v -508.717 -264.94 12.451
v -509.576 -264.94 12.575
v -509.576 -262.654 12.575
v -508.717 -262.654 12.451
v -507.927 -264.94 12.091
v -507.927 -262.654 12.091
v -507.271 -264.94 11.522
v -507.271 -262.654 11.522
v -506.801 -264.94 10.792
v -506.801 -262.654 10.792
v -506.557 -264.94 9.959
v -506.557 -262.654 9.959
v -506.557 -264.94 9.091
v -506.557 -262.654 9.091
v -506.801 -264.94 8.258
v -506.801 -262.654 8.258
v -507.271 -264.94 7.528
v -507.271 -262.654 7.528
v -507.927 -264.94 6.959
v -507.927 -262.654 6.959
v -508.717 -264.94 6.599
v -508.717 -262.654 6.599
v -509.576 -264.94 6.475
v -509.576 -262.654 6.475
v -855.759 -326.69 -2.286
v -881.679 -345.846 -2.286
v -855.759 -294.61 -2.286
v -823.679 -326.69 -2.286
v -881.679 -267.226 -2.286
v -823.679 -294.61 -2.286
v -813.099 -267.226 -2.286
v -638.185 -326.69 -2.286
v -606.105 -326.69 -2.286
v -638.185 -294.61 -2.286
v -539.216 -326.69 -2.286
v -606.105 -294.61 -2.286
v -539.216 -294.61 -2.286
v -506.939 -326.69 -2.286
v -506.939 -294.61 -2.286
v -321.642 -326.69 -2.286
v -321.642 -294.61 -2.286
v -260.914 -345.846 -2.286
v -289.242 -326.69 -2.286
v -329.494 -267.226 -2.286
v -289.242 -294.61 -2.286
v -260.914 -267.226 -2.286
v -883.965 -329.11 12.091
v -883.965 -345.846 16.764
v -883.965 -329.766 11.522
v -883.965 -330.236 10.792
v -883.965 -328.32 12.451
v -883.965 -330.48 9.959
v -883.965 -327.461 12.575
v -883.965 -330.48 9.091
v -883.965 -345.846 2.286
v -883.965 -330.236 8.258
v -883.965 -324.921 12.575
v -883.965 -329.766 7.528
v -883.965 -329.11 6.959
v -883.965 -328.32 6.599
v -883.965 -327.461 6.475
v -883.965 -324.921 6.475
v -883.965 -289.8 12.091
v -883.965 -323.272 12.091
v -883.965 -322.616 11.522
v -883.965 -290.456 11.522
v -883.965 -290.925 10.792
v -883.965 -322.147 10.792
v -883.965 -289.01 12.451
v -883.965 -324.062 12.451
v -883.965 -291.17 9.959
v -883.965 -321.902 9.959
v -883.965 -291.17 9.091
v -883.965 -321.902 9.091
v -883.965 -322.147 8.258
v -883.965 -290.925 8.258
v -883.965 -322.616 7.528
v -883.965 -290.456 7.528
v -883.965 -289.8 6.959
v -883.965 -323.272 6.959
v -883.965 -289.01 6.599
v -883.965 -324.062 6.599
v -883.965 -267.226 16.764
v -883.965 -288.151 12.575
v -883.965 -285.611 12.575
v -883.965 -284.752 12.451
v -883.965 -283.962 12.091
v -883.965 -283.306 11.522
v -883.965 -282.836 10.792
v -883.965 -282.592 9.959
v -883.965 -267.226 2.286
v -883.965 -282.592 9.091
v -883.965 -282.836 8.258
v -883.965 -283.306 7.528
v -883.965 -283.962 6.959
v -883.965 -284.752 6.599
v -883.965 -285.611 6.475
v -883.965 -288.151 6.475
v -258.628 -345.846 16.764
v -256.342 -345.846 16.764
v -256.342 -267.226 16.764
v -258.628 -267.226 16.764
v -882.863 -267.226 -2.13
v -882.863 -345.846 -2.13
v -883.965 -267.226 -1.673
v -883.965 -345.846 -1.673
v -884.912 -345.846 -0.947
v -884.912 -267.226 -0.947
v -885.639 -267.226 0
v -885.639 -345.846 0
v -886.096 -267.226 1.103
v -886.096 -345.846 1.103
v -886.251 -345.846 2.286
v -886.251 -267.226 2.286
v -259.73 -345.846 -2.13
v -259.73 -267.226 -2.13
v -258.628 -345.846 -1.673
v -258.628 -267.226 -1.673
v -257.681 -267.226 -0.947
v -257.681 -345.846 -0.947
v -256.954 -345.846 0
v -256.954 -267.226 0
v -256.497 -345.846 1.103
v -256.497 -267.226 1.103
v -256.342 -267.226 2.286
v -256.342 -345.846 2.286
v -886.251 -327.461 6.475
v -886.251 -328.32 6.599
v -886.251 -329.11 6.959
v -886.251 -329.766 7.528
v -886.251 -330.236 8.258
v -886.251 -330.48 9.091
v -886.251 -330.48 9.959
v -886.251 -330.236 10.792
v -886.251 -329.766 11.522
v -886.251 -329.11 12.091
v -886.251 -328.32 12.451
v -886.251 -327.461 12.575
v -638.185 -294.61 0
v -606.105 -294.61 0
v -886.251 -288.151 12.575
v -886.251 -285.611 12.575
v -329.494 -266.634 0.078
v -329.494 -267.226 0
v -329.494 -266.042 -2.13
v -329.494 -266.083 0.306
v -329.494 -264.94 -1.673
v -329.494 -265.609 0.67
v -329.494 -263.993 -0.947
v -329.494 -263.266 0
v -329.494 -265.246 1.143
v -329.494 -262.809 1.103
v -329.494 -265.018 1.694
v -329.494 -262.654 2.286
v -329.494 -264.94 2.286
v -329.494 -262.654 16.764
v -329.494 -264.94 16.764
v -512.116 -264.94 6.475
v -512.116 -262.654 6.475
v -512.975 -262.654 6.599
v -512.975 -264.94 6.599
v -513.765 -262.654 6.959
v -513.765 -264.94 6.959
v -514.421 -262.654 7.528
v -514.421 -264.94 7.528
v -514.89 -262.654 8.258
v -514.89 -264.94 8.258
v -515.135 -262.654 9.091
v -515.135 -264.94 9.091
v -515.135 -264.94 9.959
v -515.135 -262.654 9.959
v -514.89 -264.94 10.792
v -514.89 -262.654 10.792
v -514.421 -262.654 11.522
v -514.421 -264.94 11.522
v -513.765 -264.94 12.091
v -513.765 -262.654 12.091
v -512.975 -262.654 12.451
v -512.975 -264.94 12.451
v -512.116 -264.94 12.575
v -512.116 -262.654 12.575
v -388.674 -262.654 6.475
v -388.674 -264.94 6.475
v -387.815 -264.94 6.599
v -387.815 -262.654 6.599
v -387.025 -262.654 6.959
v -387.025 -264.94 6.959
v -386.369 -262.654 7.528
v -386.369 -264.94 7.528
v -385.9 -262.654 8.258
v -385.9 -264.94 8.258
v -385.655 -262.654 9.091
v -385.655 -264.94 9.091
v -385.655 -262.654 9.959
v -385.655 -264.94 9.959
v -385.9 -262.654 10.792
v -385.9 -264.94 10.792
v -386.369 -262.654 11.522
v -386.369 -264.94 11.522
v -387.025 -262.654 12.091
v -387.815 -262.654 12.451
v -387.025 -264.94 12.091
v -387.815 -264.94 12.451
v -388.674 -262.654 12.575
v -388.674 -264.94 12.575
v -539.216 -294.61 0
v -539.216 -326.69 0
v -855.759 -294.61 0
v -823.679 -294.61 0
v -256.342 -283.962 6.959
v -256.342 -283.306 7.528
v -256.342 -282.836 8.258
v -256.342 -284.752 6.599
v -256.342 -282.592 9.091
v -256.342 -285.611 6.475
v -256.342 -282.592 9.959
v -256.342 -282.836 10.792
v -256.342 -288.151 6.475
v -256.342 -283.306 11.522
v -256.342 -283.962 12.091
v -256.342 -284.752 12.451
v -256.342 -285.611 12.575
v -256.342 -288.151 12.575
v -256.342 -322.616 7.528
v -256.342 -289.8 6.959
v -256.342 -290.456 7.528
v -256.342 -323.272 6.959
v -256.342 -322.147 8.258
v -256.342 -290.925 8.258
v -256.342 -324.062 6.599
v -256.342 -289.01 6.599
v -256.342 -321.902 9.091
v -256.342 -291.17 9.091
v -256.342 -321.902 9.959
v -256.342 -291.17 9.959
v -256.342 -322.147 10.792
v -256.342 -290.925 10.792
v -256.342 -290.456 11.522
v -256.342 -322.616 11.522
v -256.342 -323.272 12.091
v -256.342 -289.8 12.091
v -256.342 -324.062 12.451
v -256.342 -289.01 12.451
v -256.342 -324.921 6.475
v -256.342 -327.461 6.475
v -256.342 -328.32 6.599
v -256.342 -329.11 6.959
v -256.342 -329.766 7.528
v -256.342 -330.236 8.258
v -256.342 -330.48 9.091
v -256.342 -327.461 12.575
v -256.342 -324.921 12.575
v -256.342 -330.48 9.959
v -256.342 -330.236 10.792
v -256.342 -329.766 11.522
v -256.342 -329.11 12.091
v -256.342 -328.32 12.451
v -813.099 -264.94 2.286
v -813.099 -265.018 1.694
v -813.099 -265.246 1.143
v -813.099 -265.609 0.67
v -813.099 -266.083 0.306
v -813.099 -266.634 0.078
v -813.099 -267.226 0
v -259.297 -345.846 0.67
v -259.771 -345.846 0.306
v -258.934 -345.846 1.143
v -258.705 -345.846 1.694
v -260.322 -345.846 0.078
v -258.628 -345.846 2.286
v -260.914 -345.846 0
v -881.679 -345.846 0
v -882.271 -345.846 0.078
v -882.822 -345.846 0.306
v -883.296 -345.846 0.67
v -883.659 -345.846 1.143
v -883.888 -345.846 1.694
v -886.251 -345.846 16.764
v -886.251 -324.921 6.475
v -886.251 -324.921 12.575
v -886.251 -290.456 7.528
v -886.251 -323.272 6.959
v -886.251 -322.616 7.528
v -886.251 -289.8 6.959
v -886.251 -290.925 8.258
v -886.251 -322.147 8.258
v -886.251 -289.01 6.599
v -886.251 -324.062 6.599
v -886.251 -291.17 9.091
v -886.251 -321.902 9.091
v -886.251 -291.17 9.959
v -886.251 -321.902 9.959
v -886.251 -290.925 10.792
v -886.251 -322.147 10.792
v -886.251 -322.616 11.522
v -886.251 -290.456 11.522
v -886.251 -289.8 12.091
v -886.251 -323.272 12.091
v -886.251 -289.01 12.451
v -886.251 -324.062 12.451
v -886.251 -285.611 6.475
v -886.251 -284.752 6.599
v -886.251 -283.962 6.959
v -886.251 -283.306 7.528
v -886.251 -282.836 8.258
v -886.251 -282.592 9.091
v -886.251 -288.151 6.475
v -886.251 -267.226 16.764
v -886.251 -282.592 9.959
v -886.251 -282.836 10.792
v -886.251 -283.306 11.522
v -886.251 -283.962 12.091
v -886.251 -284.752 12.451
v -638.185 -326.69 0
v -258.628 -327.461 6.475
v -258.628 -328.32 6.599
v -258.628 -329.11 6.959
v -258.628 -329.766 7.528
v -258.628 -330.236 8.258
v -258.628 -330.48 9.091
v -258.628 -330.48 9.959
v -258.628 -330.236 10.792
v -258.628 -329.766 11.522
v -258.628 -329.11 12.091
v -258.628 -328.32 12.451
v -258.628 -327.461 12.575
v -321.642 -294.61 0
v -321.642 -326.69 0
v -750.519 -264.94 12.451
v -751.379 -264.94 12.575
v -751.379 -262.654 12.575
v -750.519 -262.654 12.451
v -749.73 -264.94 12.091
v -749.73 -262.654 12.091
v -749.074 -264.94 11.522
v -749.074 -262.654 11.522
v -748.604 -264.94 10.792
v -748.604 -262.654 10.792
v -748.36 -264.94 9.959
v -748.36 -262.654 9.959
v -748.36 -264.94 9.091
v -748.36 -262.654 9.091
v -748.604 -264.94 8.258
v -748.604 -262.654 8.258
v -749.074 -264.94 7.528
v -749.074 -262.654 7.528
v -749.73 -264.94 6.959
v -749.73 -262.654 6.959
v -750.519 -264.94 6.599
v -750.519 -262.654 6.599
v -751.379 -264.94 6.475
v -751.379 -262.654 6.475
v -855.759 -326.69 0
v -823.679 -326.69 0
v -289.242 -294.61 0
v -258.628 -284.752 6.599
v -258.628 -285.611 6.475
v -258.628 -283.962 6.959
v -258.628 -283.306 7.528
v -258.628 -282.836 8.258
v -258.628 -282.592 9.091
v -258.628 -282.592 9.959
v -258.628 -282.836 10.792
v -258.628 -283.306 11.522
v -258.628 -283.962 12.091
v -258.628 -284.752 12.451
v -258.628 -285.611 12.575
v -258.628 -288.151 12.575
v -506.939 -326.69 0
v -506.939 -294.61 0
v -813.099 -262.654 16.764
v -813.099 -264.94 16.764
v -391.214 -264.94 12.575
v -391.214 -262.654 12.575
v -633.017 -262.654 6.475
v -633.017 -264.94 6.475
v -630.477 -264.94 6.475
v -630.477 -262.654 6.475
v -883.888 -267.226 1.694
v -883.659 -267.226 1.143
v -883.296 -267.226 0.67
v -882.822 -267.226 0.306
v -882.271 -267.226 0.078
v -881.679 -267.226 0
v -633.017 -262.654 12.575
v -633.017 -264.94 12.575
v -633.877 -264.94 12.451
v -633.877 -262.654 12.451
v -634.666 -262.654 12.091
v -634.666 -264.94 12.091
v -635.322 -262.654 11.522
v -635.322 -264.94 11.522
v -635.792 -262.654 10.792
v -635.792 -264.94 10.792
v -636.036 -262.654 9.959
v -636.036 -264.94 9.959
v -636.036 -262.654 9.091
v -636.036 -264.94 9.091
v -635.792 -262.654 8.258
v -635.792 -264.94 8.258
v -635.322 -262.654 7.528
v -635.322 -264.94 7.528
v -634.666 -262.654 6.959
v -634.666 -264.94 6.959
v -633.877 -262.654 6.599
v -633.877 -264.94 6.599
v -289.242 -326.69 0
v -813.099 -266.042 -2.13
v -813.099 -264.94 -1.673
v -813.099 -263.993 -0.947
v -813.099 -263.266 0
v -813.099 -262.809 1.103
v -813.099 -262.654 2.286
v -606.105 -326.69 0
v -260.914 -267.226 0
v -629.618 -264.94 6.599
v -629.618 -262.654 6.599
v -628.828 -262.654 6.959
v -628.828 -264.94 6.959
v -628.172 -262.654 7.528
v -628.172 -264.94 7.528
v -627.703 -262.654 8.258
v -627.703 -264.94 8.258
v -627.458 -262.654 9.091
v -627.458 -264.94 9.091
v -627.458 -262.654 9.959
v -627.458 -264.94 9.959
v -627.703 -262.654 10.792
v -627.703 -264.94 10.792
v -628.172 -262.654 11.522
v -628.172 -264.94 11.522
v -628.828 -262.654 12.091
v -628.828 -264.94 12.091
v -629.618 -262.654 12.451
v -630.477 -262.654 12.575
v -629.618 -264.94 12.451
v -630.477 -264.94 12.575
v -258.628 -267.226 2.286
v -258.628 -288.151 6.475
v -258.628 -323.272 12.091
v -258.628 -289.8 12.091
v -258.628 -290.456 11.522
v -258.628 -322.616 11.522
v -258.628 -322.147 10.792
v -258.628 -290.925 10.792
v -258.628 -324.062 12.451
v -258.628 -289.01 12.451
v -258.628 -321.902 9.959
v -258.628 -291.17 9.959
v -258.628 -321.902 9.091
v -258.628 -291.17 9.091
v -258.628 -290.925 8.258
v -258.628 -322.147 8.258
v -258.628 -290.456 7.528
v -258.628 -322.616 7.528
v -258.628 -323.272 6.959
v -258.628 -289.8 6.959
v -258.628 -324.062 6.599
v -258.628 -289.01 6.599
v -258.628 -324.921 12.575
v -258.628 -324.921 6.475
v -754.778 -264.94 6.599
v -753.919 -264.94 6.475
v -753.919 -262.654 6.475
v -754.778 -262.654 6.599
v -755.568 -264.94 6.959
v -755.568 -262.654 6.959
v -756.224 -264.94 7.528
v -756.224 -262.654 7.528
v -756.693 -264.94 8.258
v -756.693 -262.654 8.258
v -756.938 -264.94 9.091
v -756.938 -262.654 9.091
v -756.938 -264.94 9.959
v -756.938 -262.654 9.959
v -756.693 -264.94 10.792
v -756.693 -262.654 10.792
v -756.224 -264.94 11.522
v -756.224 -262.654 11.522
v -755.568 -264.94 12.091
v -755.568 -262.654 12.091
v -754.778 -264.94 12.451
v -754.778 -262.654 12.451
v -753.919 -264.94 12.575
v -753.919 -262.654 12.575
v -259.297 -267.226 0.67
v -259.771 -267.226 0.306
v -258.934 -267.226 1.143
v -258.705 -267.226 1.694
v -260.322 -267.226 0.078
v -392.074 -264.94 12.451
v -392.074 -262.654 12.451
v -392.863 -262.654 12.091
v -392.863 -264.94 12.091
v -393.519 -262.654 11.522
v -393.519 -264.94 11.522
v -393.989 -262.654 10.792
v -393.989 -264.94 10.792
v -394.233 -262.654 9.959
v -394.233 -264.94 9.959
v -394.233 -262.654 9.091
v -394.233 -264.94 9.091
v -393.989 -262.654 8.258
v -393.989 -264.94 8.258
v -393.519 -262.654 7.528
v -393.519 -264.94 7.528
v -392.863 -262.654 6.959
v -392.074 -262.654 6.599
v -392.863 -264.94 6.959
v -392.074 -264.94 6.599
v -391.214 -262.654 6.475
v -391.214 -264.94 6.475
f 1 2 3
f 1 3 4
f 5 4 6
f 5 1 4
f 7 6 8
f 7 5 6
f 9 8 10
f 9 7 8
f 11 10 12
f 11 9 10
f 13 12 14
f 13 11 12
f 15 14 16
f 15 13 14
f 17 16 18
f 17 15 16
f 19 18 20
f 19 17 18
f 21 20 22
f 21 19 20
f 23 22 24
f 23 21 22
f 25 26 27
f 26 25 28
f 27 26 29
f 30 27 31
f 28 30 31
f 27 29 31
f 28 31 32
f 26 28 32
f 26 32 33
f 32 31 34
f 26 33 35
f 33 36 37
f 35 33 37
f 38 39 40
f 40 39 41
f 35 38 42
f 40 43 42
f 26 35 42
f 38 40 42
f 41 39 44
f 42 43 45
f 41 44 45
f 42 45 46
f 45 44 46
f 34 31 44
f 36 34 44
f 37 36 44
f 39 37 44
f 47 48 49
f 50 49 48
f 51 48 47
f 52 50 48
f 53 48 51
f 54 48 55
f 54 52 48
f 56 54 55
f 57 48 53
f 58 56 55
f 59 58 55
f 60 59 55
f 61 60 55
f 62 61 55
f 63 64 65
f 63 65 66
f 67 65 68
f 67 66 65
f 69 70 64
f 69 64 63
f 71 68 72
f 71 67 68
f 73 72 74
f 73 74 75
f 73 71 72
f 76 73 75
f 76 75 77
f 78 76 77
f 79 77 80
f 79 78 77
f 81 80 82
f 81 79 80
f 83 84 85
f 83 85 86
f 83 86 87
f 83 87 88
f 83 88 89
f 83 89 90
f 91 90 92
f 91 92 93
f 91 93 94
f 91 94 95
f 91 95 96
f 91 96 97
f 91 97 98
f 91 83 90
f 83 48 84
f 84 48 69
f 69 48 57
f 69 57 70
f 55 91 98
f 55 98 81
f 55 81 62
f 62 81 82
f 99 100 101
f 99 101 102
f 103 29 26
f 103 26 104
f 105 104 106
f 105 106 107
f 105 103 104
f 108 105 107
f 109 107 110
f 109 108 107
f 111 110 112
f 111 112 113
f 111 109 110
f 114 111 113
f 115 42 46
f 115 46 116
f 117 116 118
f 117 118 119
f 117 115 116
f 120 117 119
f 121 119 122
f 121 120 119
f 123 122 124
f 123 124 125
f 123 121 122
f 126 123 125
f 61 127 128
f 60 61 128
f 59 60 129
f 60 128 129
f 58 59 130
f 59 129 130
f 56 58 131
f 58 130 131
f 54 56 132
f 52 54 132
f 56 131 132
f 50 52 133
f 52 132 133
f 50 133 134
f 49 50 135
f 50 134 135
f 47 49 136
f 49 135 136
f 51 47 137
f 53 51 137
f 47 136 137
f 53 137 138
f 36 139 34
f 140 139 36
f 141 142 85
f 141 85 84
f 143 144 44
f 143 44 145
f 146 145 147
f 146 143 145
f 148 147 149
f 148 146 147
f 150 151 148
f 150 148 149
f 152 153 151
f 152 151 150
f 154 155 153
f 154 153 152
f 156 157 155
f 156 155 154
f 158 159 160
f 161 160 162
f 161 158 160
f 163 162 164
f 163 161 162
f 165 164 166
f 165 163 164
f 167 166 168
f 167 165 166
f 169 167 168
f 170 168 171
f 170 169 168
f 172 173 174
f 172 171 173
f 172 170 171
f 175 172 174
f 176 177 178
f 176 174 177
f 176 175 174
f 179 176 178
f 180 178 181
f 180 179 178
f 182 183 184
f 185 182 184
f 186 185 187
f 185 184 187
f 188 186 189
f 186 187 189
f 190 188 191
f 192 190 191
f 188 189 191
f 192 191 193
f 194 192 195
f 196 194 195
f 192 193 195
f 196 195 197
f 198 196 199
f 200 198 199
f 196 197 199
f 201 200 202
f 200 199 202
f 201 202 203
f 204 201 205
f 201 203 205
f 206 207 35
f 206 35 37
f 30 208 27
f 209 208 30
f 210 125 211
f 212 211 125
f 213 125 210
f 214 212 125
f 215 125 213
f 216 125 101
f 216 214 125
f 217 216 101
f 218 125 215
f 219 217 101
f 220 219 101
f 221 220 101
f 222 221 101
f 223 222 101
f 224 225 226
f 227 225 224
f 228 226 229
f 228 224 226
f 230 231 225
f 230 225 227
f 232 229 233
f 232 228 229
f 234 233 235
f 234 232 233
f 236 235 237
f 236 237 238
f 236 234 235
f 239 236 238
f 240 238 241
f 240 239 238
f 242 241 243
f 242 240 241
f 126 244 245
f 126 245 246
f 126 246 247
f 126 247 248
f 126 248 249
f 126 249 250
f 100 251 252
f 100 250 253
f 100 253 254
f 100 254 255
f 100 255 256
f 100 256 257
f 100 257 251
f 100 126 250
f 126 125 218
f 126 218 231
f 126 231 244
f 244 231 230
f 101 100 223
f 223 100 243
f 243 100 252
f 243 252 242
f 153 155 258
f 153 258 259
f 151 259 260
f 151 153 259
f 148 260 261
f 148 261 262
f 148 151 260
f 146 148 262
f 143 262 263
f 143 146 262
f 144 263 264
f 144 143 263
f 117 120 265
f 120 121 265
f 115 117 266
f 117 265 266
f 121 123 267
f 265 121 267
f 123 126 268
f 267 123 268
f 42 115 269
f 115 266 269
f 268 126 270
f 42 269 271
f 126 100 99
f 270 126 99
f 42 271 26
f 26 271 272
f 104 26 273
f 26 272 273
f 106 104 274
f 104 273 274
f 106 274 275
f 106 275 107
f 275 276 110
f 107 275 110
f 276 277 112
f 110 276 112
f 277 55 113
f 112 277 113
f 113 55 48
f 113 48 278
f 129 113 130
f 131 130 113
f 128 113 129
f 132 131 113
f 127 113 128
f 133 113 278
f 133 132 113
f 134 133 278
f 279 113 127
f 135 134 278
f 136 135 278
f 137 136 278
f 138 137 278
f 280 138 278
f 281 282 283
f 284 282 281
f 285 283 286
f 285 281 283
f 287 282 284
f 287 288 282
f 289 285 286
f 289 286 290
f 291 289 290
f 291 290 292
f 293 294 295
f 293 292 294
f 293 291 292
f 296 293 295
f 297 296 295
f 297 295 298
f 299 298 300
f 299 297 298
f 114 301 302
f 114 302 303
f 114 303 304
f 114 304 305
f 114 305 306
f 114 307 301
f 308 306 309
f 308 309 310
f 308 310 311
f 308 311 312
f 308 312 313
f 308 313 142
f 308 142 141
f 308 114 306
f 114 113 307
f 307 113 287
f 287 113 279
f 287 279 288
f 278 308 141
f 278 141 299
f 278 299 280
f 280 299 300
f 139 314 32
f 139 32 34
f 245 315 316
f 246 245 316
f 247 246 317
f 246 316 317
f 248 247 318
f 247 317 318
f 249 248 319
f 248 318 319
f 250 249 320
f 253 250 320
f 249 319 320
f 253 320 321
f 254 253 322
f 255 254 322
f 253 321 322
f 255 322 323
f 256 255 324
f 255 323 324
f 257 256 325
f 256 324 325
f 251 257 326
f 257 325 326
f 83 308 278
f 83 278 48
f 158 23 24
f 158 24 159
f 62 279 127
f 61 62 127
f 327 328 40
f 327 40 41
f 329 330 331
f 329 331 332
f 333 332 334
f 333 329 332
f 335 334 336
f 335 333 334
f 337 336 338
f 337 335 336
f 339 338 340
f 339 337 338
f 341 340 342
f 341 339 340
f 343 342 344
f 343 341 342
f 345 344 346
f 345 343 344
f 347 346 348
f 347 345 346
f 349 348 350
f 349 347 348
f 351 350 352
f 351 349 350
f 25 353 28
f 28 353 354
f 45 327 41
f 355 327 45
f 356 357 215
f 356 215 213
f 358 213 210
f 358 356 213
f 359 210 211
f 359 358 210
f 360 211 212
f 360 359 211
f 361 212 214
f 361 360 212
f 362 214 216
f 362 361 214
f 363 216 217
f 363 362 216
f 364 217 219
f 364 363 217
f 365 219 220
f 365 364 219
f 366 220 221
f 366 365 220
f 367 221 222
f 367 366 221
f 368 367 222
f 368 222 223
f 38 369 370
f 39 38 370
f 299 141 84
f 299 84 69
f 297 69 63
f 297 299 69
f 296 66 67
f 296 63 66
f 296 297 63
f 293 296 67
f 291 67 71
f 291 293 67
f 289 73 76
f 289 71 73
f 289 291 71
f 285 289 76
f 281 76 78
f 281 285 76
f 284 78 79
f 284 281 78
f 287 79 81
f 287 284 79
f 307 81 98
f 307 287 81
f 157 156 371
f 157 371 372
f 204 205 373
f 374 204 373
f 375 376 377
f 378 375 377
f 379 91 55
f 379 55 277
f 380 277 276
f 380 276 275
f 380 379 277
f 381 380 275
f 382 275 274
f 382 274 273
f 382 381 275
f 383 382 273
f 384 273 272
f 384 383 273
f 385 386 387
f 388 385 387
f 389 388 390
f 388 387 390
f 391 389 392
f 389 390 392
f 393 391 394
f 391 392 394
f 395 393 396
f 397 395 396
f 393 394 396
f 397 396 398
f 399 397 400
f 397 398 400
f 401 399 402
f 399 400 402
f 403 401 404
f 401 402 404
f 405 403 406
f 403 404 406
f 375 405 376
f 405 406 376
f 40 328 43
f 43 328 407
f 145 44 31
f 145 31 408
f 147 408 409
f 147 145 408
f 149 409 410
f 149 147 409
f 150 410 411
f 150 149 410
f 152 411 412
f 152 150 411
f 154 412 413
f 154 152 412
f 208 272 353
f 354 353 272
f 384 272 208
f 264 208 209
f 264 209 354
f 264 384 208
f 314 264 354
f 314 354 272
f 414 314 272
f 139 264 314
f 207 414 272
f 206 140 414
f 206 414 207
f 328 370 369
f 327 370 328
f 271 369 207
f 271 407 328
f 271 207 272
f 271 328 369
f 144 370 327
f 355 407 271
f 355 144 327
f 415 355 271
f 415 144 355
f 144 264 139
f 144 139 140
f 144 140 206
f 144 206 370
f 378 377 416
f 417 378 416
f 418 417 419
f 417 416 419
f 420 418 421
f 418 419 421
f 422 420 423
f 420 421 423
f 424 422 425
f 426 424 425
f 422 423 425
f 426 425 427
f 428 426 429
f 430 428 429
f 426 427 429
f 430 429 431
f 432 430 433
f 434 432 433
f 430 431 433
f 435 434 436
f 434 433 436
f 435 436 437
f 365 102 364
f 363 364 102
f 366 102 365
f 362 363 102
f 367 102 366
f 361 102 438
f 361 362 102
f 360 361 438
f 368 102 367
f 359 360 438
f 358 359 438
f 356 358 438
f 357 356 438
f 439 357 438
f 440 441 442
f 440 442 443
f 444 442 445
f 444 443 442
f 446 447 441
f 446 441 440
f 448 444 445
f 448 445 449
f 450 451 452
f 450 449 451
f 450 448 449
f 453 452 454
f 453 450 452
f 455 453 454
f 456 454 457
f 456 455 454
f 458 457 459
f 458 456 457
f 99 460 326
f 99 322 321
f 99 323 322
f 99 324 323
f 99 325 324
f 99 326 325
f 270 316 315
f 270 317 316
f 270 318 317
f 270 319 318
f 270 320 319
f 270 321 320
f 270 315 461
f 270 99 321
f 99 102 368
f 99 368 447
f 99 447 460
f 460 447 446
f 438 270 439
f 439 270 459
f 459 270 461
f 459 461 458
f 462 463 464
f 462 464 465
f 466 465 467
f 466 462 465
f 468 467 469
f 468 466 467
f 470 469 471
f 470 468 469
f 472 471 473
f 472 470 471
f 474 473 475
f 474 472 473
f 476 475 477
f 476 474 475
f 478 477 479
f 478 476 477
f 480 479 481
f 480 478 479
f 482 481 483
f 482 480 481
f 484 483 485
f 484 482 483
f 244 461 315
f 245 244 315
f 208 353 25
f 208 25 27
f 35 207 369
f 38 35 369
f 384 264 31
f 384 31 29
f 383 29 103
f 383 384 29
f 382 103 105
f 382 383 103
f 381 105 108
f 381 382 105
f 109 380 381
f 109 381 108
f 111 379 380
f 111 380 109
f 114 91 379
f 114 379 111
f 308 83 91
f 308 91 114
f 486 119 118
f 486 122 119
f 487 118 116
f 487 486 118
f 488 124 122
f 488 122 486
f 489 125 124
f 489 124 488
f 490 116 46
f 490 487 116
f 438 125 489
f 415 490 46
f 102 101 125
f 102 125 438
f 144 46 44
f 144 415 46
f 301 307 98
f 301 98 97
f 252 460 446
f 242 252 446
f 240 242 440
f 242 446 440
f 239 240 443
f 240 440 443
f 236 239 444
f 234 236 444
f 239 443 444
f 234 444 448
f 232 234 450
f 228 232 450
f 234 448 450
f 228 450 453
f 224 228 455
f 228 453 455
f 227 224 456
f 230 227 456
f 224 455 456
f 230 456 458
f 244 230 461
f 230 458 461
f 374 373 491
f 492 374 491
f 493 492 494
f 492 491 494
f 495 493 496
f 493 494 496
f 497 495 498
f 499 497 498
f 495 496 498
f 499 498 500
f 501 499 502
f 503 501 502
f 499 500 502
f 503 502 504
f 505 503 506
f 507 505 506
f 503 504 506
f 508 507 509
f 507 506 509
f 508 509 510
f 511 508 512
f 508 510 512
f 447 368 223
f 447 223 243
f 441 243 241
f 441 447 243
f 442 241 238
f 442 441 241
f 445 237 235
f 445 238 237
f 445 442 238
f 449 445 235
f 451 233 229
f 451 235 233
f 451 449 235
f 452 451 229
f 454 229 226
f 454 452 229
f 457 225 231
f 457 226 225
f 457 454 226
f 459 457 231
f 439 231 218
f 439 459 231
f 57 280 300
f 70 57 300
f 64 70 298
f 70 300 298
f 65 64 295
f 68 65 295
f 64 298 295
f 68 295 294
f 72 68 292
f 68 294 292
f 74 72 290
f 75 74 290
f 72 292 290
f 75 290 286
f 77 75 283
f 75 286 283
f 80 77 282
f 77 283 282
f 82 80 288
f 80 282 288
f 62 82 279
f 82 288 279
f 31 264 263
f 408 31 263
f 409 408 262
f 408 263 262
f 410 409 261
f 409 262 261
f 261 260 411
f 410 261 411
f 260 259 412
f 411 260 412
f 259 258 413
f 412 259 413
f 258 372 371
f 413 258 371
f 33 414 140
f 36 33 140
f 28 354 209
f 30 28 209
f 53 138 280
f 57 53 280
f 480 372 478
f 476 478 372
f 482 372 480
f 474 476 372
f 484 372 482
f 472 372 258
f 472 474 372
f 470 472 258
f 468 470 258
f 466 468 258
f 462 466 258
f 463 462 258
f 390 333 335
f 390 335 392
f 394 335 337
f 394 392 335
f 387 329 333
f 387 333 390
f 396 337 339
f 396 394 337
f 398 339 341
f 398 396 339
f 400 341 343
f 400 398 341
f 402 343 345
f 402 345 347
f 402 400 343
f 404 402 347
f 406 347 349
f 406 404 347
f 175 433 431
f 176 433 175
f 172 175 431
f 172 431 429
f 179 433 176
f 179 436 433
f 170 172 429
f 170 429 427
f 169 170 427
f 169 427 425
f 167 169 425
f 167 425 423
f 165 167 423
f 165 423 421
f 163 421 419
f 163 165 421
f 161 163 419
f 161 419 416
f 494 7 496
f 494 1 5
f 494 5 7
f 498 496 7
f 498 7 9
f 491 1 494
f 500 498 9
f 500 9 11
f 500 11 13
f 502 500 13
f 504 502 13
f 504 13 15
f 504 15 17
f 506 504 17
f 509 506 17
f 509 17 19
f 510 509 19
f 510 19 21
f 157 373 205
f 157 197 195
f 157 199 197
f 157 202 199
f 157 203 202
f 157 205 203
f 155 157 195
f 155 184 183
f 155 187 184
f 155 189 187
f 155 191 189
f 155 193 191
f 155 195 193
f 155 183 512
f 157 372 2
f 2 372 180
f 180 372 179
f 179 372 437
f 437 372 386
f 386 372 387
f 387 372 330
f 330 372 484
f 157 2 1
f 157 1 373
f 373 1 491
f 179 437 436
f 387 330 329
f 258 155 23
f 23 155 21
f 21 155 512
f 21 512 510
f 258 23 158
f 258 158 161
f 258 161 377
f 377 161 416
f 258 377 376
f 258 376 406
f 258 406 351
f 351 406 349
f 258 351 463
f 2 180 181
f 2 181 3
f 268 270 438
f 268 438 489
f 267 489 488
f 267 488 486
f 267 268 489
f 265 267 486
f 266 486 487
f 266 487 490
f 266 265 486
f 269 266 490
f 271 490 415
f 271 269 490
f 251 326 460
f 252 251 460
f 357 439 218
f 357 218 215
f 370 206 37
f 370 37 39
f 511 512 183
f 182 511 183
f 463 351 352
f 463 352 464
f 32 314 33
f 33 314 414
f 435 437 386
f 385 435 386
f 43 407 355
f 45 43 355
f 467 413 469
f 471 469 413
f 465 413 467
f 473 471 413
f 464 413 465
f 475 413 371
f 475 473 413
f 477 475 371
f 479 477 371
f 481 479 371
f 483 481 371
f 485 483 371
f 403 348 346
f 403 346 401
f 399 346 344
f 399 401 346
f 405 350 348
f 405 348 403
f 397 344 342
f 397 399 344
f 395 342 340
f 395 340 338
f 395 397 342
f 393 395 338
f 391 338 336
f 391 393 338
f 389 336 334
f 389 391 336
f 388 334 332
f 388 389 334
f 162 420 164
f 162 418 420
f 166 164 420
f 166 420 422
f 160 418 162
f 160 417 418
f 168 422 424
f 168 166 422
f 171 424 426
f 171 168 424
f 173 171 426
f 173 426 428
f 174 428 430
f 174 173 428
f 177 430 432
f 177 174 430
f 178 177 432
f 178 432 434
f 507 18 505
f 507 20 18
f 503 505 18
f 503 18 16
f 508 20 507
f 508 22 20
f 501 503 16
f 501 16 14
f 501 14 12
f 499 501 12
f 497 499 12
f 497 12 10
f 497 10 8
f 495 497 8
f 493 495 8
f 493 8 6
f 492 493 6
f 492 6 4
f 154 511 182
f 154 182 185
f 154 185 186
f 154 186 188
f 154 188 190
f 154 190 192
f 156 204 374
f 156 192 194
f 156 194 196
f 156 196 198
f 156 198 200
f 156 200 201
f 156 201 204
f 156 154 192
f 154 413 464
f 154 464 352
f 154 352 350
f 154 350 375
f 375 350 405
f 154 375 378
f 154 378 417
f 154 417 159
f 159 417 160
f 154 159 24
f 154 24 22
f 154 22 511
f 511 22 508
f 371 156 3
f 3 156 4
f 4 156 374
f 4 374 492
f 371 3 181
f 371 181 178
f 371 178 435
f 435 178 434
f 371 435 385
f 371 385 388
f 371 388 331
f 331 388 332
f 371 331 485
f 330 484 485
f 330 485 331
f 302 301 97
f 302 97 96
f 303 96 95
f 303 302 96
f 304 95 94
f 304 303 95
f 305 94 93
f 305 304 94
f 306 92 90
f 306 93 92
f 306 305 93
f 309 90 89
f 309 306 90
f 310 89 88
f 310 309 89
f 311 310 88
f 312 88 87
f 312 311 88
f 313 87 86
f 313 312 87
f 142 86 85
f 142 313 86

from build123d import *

# Parameters (mm, degrees)
SKETCH1_W                      = 629.90984
SKETCH1_H                      = 78.62062
SKETCH1_W_2                    = 32.08
SKETCH1_H_2                    = 32.08
SKETCH1_W_3                    = 32.277504859
SKETCH1_H_3                    = 32.079999999
SKETCH1_W_4                    = 32.400630989
BASE_FLANGE1_DEPTH             = 2.286
EDGE_FLANGE1_STRIP_W           = 13.716
EDGE_FLANGE1_STRIP_H           = 2.286
EDGE_FLANGE1_STRIP_CUT_DEPTH   = 78.62062
EDGE_FLANGE1_STRIP_2_W         = 13.716
EDGE_FLANGE1_STRIP_2_H         = 2.286
EDGE_FLANGE1_STRIP_CUT_2_DEPTH = 78.62062
EDGE_FLANGE1_DEPTH             = 78.62062
EDGE_FLANGE1_BEND_DEPTH        = 78.62062
EDGE_FLANGE2_DEPTH             = 483.60584
CUT_EXTRUDE2_DEPTH             = 719.802540597
CUT_EXTRUDE3_DEPTH             = 891.094678327


# Sheet-metal steps are written as plain solids
with BuildPart() as part:
    # Sketch1 → Base-Flange1 (new body)
    with BuildSketch(Plane.XY):
        with Locations((-571.296524868, -306.535976872)):
            Rectangle(SKETCH1_W, SKETCH1_H)
        with Locations((-839.718644868, -310.649506872)):
            Rectangle(SKETCH1_W_2, SKETCH1_H_2, mode=Mode.SUBTRACT)
        with Locations((-622.144784868, -310.649506872)):
            Rectangle(SKETCH1_W_2, SKETCH1_H_2, mode=Mode.SUBTRACT)
        with Locations((-523.077472438, -310.649506873)):
            Rectangle(SKETCH1_W_3, SKETCH1_H_3, mode=Mode.SUBTRACT)
        with Locations((-305.442049373, -310.649506872)):
            Rectangle(SKETCH1_W_4, SKETCH1_H_2, mode=Mode.SUBTRACT)
    extrude(amount=-BASE_FLANGE1_DEPTH)

    # Edge-Flange1 strip (across the edge) → Edge-Flange1 strip cut (cut)
    with BuildSketch(Plane(origin=(-256.341604868, -345.846286872, 0), x_dir=(-1, 0, 0), z_dir=(0, 1, 0))):
        with Locations((-2.286, -1.143)):
            Rectangle(EDGE_FLANGE1_STRIP_W, EDGE_FLANGE1_STRIP_H)
    extrude(amount=EDGE_FLANGE1_STRIP_CUT_DEPTH, mode=Mode.SUBTRACT)

    # Edge-Flange1 strip 2 (across the edge) → Edge-Flange1 strip cut 2 (cut)
    with BuildSketch(Plane(origin=(-886.251444868, -267.225666872, 0), x_dir=(1, 0, 0), z_dir=(0, -1, 0))):
        with Locations((-2.286, -1.143)):
            Rectangle(EDGE_FLANGE1_STRIP_2_W, EDGE_FLANGE1_STRIP_2_H)
    extrude(amount=EDGE_FLANGE1_STRIP_CUT_2_DEPTH, mode=Mode.SUBTRACT)

    # Edge-Flange1 section (across the edge) → Edge-Flange1 (add)
    with BuildSketch(Plane(origin=(-256.341604868, -345.846286872, 0), x_dir=(-1, 0, 0), z_dir=(0, 1, 0))):
        with BuildLine():
            Line((0, 2.286), (0, 16.764))
            Line((0, 16.764), (2.286, 16.764))
            Line((2.286, 16.764), (2.286, 2.286))
            ThreePointArc((2.286, 2.286), (2.955553898, 0.669553898), (4.572, 0))
            Line((4.572, 0), (4.572, -2.286))
            ThreePointArc((4.572, -2.286), (1.339107796, -0.946892204), (0, 2.286))
        make_face()
    extrude(amount=EDGE_FLANGE1_DEPTH)

    # Edge-Flange1 section 2 (across the edge) → Edge-Flange1 bend (add)
    with BuildSketch(Plane(origin=(-886.251444868, -267.225666872, 0), x_dir=(1, 0, 0), z_dir=(0, -1, 0))):
        with BuildLine():
            Line((0, 2.286), (0, 16.764))
            Line((0, 16.764), (2.286, 16.764))
            Line((2.286, 16.764), (2.286, 2.286))
            ThreePointArc((2.286, 2.286), (2.955553898, 0.669553898), (4.572, 0))
            Line((4.572, 0), (4.572, -2.286))
            ThreePointArc((4.572, -2.286), (1.339107796, -0.946892204), (0, 2.286))
        make_face()
    extrude(amount=EDGE_FLANGE1_BEND_DEPTH)

    # Edge-Flange2 section (across the edge) → Edge-Flange2 (add)
    with BuildSketch(Plane(origin=(-329.493604868, -264.939666872, 0), x_dir=(0, -1, 0), z_dir=(-1, 0, 0))):
        with BuildLine():
            Line((-2.286, 2.286), (-2.286, 16.764))
            Line((-2.286, 16.764), (0, 16.764))
            Line((0, 16.764), (0, 2.286))
            ThreePointArc((0, 2.286), (0.669553898, 0.669553898), (2.286, 0))
            Line((2.286, 0), (2.286, -2.286))
            ThreePointArc((2.286, -2.286), (-0.946892204, -0.946892204), (-2.286, 2.286))
        make_face()
    extrude(amount=EDGE_FLANGE2_DEPTH)

    # Sketch26 → Cut-Extrude2 (cut, through all)
    with BuildSketch(Plane.ZY.offset(886.251444868)):
        with BuildLine():
            Line((12.575, -285.610821872), (12.575, -288.150821872))
            ThreePointArc((12.575, -288.150821872), (9.525, -291.200821872), (6.475, -288.150821872))
            Line((6.475, -288.150821872), (6.475, -285.610821872))
            ThreePointArc((6.475, -285.610821872), (9.525, -282.560821872), (12.575, -285.610821872))
        make_face()
        with BuildLine():
            Line((12.575, -327.461131872), (12.575, -324.921131872))
            ThreePointArc((12.575, -324.921131872), (9.525, -321.871131872), (6.475, -324.921131872))
            Line((6.475, -324.921131872), (6.475, -327.461131872))
            ThreePointArc((6.475, -327.461131872), (9.525, -330.511131872), (12.575, -327.461131872))
        make_face()
    extrude(amount=-CUT_EXTRUDE2_DEPTH, mode=Mode.SUBTRACT)

    # Sketch27 → Cut-Extrude3 (cut, through all)
    with BuildSketch(Plane.XZ.offset(264.939666872)):
        with BuildLine():
            Line((-753.918714868, 12.575), (-751.378714868, 12.575))
            ThreePointArc((-751.378714868, 12.575), (-748.328714868, 9.525), (-751.378714868, 6.475))
            Line((-751.378714868, 6.475), (-753.918714868, 6.475))
            ThreePointArc((-753.918714868, 6.475), (-756.968714868, 9.525), (-753.918714868, 12.575))
        make_face()
        with BuildLine():
            Line((-630.477254868, 12.575), (-633.017254868, 12.575))
            ThreePointArc((-633.017254868, 12.575), (-636.067254868, 9.525), (-633.017254868, 6.475))
            Line((-633.017254868, 6.475), (-630.477254868, 6.475))
            ThreePointArc((-630.477254868, 6.475), (-627.427254868, 9.525), (-630.477254868, 12.575))
        make_face()
        with BuildLine():
            Line((-388.674334868, 12.575), (-391.214334868, 12.575))
            ThreePointArc((-391.214334868, 12.575), (-394.264334868, 9.525), (-391.214334868, 6.475))
            Line((-391.214334868, 6.475), (-388.674334868, 6.475))
            ThreePointArc((-388.674334868, 6.475), (-385.624334868, 9.525), (-388.674334868, 12.575))
        make_face()
        with BuildLine():
            Line((-512.115794868, 12.575), (-509.575794868, 12.575))
            ThreePointArc((-509.575794868, 12.575), (-506.525794868, 9.525), (-509.575794868, 6.475))
            Line((-509.575794868, 6.475), (-512.115794868, 6.475))
            ThreePointArc((-512.115794868, 6.475), (-515.165794868, 9.525), (-512.115794868, 12.575))
        make_face()
    extrude(amount=-CUT_EXTRUDE3_DEPTH, mode=Mode.SUBTRACT)


solid = part.part
